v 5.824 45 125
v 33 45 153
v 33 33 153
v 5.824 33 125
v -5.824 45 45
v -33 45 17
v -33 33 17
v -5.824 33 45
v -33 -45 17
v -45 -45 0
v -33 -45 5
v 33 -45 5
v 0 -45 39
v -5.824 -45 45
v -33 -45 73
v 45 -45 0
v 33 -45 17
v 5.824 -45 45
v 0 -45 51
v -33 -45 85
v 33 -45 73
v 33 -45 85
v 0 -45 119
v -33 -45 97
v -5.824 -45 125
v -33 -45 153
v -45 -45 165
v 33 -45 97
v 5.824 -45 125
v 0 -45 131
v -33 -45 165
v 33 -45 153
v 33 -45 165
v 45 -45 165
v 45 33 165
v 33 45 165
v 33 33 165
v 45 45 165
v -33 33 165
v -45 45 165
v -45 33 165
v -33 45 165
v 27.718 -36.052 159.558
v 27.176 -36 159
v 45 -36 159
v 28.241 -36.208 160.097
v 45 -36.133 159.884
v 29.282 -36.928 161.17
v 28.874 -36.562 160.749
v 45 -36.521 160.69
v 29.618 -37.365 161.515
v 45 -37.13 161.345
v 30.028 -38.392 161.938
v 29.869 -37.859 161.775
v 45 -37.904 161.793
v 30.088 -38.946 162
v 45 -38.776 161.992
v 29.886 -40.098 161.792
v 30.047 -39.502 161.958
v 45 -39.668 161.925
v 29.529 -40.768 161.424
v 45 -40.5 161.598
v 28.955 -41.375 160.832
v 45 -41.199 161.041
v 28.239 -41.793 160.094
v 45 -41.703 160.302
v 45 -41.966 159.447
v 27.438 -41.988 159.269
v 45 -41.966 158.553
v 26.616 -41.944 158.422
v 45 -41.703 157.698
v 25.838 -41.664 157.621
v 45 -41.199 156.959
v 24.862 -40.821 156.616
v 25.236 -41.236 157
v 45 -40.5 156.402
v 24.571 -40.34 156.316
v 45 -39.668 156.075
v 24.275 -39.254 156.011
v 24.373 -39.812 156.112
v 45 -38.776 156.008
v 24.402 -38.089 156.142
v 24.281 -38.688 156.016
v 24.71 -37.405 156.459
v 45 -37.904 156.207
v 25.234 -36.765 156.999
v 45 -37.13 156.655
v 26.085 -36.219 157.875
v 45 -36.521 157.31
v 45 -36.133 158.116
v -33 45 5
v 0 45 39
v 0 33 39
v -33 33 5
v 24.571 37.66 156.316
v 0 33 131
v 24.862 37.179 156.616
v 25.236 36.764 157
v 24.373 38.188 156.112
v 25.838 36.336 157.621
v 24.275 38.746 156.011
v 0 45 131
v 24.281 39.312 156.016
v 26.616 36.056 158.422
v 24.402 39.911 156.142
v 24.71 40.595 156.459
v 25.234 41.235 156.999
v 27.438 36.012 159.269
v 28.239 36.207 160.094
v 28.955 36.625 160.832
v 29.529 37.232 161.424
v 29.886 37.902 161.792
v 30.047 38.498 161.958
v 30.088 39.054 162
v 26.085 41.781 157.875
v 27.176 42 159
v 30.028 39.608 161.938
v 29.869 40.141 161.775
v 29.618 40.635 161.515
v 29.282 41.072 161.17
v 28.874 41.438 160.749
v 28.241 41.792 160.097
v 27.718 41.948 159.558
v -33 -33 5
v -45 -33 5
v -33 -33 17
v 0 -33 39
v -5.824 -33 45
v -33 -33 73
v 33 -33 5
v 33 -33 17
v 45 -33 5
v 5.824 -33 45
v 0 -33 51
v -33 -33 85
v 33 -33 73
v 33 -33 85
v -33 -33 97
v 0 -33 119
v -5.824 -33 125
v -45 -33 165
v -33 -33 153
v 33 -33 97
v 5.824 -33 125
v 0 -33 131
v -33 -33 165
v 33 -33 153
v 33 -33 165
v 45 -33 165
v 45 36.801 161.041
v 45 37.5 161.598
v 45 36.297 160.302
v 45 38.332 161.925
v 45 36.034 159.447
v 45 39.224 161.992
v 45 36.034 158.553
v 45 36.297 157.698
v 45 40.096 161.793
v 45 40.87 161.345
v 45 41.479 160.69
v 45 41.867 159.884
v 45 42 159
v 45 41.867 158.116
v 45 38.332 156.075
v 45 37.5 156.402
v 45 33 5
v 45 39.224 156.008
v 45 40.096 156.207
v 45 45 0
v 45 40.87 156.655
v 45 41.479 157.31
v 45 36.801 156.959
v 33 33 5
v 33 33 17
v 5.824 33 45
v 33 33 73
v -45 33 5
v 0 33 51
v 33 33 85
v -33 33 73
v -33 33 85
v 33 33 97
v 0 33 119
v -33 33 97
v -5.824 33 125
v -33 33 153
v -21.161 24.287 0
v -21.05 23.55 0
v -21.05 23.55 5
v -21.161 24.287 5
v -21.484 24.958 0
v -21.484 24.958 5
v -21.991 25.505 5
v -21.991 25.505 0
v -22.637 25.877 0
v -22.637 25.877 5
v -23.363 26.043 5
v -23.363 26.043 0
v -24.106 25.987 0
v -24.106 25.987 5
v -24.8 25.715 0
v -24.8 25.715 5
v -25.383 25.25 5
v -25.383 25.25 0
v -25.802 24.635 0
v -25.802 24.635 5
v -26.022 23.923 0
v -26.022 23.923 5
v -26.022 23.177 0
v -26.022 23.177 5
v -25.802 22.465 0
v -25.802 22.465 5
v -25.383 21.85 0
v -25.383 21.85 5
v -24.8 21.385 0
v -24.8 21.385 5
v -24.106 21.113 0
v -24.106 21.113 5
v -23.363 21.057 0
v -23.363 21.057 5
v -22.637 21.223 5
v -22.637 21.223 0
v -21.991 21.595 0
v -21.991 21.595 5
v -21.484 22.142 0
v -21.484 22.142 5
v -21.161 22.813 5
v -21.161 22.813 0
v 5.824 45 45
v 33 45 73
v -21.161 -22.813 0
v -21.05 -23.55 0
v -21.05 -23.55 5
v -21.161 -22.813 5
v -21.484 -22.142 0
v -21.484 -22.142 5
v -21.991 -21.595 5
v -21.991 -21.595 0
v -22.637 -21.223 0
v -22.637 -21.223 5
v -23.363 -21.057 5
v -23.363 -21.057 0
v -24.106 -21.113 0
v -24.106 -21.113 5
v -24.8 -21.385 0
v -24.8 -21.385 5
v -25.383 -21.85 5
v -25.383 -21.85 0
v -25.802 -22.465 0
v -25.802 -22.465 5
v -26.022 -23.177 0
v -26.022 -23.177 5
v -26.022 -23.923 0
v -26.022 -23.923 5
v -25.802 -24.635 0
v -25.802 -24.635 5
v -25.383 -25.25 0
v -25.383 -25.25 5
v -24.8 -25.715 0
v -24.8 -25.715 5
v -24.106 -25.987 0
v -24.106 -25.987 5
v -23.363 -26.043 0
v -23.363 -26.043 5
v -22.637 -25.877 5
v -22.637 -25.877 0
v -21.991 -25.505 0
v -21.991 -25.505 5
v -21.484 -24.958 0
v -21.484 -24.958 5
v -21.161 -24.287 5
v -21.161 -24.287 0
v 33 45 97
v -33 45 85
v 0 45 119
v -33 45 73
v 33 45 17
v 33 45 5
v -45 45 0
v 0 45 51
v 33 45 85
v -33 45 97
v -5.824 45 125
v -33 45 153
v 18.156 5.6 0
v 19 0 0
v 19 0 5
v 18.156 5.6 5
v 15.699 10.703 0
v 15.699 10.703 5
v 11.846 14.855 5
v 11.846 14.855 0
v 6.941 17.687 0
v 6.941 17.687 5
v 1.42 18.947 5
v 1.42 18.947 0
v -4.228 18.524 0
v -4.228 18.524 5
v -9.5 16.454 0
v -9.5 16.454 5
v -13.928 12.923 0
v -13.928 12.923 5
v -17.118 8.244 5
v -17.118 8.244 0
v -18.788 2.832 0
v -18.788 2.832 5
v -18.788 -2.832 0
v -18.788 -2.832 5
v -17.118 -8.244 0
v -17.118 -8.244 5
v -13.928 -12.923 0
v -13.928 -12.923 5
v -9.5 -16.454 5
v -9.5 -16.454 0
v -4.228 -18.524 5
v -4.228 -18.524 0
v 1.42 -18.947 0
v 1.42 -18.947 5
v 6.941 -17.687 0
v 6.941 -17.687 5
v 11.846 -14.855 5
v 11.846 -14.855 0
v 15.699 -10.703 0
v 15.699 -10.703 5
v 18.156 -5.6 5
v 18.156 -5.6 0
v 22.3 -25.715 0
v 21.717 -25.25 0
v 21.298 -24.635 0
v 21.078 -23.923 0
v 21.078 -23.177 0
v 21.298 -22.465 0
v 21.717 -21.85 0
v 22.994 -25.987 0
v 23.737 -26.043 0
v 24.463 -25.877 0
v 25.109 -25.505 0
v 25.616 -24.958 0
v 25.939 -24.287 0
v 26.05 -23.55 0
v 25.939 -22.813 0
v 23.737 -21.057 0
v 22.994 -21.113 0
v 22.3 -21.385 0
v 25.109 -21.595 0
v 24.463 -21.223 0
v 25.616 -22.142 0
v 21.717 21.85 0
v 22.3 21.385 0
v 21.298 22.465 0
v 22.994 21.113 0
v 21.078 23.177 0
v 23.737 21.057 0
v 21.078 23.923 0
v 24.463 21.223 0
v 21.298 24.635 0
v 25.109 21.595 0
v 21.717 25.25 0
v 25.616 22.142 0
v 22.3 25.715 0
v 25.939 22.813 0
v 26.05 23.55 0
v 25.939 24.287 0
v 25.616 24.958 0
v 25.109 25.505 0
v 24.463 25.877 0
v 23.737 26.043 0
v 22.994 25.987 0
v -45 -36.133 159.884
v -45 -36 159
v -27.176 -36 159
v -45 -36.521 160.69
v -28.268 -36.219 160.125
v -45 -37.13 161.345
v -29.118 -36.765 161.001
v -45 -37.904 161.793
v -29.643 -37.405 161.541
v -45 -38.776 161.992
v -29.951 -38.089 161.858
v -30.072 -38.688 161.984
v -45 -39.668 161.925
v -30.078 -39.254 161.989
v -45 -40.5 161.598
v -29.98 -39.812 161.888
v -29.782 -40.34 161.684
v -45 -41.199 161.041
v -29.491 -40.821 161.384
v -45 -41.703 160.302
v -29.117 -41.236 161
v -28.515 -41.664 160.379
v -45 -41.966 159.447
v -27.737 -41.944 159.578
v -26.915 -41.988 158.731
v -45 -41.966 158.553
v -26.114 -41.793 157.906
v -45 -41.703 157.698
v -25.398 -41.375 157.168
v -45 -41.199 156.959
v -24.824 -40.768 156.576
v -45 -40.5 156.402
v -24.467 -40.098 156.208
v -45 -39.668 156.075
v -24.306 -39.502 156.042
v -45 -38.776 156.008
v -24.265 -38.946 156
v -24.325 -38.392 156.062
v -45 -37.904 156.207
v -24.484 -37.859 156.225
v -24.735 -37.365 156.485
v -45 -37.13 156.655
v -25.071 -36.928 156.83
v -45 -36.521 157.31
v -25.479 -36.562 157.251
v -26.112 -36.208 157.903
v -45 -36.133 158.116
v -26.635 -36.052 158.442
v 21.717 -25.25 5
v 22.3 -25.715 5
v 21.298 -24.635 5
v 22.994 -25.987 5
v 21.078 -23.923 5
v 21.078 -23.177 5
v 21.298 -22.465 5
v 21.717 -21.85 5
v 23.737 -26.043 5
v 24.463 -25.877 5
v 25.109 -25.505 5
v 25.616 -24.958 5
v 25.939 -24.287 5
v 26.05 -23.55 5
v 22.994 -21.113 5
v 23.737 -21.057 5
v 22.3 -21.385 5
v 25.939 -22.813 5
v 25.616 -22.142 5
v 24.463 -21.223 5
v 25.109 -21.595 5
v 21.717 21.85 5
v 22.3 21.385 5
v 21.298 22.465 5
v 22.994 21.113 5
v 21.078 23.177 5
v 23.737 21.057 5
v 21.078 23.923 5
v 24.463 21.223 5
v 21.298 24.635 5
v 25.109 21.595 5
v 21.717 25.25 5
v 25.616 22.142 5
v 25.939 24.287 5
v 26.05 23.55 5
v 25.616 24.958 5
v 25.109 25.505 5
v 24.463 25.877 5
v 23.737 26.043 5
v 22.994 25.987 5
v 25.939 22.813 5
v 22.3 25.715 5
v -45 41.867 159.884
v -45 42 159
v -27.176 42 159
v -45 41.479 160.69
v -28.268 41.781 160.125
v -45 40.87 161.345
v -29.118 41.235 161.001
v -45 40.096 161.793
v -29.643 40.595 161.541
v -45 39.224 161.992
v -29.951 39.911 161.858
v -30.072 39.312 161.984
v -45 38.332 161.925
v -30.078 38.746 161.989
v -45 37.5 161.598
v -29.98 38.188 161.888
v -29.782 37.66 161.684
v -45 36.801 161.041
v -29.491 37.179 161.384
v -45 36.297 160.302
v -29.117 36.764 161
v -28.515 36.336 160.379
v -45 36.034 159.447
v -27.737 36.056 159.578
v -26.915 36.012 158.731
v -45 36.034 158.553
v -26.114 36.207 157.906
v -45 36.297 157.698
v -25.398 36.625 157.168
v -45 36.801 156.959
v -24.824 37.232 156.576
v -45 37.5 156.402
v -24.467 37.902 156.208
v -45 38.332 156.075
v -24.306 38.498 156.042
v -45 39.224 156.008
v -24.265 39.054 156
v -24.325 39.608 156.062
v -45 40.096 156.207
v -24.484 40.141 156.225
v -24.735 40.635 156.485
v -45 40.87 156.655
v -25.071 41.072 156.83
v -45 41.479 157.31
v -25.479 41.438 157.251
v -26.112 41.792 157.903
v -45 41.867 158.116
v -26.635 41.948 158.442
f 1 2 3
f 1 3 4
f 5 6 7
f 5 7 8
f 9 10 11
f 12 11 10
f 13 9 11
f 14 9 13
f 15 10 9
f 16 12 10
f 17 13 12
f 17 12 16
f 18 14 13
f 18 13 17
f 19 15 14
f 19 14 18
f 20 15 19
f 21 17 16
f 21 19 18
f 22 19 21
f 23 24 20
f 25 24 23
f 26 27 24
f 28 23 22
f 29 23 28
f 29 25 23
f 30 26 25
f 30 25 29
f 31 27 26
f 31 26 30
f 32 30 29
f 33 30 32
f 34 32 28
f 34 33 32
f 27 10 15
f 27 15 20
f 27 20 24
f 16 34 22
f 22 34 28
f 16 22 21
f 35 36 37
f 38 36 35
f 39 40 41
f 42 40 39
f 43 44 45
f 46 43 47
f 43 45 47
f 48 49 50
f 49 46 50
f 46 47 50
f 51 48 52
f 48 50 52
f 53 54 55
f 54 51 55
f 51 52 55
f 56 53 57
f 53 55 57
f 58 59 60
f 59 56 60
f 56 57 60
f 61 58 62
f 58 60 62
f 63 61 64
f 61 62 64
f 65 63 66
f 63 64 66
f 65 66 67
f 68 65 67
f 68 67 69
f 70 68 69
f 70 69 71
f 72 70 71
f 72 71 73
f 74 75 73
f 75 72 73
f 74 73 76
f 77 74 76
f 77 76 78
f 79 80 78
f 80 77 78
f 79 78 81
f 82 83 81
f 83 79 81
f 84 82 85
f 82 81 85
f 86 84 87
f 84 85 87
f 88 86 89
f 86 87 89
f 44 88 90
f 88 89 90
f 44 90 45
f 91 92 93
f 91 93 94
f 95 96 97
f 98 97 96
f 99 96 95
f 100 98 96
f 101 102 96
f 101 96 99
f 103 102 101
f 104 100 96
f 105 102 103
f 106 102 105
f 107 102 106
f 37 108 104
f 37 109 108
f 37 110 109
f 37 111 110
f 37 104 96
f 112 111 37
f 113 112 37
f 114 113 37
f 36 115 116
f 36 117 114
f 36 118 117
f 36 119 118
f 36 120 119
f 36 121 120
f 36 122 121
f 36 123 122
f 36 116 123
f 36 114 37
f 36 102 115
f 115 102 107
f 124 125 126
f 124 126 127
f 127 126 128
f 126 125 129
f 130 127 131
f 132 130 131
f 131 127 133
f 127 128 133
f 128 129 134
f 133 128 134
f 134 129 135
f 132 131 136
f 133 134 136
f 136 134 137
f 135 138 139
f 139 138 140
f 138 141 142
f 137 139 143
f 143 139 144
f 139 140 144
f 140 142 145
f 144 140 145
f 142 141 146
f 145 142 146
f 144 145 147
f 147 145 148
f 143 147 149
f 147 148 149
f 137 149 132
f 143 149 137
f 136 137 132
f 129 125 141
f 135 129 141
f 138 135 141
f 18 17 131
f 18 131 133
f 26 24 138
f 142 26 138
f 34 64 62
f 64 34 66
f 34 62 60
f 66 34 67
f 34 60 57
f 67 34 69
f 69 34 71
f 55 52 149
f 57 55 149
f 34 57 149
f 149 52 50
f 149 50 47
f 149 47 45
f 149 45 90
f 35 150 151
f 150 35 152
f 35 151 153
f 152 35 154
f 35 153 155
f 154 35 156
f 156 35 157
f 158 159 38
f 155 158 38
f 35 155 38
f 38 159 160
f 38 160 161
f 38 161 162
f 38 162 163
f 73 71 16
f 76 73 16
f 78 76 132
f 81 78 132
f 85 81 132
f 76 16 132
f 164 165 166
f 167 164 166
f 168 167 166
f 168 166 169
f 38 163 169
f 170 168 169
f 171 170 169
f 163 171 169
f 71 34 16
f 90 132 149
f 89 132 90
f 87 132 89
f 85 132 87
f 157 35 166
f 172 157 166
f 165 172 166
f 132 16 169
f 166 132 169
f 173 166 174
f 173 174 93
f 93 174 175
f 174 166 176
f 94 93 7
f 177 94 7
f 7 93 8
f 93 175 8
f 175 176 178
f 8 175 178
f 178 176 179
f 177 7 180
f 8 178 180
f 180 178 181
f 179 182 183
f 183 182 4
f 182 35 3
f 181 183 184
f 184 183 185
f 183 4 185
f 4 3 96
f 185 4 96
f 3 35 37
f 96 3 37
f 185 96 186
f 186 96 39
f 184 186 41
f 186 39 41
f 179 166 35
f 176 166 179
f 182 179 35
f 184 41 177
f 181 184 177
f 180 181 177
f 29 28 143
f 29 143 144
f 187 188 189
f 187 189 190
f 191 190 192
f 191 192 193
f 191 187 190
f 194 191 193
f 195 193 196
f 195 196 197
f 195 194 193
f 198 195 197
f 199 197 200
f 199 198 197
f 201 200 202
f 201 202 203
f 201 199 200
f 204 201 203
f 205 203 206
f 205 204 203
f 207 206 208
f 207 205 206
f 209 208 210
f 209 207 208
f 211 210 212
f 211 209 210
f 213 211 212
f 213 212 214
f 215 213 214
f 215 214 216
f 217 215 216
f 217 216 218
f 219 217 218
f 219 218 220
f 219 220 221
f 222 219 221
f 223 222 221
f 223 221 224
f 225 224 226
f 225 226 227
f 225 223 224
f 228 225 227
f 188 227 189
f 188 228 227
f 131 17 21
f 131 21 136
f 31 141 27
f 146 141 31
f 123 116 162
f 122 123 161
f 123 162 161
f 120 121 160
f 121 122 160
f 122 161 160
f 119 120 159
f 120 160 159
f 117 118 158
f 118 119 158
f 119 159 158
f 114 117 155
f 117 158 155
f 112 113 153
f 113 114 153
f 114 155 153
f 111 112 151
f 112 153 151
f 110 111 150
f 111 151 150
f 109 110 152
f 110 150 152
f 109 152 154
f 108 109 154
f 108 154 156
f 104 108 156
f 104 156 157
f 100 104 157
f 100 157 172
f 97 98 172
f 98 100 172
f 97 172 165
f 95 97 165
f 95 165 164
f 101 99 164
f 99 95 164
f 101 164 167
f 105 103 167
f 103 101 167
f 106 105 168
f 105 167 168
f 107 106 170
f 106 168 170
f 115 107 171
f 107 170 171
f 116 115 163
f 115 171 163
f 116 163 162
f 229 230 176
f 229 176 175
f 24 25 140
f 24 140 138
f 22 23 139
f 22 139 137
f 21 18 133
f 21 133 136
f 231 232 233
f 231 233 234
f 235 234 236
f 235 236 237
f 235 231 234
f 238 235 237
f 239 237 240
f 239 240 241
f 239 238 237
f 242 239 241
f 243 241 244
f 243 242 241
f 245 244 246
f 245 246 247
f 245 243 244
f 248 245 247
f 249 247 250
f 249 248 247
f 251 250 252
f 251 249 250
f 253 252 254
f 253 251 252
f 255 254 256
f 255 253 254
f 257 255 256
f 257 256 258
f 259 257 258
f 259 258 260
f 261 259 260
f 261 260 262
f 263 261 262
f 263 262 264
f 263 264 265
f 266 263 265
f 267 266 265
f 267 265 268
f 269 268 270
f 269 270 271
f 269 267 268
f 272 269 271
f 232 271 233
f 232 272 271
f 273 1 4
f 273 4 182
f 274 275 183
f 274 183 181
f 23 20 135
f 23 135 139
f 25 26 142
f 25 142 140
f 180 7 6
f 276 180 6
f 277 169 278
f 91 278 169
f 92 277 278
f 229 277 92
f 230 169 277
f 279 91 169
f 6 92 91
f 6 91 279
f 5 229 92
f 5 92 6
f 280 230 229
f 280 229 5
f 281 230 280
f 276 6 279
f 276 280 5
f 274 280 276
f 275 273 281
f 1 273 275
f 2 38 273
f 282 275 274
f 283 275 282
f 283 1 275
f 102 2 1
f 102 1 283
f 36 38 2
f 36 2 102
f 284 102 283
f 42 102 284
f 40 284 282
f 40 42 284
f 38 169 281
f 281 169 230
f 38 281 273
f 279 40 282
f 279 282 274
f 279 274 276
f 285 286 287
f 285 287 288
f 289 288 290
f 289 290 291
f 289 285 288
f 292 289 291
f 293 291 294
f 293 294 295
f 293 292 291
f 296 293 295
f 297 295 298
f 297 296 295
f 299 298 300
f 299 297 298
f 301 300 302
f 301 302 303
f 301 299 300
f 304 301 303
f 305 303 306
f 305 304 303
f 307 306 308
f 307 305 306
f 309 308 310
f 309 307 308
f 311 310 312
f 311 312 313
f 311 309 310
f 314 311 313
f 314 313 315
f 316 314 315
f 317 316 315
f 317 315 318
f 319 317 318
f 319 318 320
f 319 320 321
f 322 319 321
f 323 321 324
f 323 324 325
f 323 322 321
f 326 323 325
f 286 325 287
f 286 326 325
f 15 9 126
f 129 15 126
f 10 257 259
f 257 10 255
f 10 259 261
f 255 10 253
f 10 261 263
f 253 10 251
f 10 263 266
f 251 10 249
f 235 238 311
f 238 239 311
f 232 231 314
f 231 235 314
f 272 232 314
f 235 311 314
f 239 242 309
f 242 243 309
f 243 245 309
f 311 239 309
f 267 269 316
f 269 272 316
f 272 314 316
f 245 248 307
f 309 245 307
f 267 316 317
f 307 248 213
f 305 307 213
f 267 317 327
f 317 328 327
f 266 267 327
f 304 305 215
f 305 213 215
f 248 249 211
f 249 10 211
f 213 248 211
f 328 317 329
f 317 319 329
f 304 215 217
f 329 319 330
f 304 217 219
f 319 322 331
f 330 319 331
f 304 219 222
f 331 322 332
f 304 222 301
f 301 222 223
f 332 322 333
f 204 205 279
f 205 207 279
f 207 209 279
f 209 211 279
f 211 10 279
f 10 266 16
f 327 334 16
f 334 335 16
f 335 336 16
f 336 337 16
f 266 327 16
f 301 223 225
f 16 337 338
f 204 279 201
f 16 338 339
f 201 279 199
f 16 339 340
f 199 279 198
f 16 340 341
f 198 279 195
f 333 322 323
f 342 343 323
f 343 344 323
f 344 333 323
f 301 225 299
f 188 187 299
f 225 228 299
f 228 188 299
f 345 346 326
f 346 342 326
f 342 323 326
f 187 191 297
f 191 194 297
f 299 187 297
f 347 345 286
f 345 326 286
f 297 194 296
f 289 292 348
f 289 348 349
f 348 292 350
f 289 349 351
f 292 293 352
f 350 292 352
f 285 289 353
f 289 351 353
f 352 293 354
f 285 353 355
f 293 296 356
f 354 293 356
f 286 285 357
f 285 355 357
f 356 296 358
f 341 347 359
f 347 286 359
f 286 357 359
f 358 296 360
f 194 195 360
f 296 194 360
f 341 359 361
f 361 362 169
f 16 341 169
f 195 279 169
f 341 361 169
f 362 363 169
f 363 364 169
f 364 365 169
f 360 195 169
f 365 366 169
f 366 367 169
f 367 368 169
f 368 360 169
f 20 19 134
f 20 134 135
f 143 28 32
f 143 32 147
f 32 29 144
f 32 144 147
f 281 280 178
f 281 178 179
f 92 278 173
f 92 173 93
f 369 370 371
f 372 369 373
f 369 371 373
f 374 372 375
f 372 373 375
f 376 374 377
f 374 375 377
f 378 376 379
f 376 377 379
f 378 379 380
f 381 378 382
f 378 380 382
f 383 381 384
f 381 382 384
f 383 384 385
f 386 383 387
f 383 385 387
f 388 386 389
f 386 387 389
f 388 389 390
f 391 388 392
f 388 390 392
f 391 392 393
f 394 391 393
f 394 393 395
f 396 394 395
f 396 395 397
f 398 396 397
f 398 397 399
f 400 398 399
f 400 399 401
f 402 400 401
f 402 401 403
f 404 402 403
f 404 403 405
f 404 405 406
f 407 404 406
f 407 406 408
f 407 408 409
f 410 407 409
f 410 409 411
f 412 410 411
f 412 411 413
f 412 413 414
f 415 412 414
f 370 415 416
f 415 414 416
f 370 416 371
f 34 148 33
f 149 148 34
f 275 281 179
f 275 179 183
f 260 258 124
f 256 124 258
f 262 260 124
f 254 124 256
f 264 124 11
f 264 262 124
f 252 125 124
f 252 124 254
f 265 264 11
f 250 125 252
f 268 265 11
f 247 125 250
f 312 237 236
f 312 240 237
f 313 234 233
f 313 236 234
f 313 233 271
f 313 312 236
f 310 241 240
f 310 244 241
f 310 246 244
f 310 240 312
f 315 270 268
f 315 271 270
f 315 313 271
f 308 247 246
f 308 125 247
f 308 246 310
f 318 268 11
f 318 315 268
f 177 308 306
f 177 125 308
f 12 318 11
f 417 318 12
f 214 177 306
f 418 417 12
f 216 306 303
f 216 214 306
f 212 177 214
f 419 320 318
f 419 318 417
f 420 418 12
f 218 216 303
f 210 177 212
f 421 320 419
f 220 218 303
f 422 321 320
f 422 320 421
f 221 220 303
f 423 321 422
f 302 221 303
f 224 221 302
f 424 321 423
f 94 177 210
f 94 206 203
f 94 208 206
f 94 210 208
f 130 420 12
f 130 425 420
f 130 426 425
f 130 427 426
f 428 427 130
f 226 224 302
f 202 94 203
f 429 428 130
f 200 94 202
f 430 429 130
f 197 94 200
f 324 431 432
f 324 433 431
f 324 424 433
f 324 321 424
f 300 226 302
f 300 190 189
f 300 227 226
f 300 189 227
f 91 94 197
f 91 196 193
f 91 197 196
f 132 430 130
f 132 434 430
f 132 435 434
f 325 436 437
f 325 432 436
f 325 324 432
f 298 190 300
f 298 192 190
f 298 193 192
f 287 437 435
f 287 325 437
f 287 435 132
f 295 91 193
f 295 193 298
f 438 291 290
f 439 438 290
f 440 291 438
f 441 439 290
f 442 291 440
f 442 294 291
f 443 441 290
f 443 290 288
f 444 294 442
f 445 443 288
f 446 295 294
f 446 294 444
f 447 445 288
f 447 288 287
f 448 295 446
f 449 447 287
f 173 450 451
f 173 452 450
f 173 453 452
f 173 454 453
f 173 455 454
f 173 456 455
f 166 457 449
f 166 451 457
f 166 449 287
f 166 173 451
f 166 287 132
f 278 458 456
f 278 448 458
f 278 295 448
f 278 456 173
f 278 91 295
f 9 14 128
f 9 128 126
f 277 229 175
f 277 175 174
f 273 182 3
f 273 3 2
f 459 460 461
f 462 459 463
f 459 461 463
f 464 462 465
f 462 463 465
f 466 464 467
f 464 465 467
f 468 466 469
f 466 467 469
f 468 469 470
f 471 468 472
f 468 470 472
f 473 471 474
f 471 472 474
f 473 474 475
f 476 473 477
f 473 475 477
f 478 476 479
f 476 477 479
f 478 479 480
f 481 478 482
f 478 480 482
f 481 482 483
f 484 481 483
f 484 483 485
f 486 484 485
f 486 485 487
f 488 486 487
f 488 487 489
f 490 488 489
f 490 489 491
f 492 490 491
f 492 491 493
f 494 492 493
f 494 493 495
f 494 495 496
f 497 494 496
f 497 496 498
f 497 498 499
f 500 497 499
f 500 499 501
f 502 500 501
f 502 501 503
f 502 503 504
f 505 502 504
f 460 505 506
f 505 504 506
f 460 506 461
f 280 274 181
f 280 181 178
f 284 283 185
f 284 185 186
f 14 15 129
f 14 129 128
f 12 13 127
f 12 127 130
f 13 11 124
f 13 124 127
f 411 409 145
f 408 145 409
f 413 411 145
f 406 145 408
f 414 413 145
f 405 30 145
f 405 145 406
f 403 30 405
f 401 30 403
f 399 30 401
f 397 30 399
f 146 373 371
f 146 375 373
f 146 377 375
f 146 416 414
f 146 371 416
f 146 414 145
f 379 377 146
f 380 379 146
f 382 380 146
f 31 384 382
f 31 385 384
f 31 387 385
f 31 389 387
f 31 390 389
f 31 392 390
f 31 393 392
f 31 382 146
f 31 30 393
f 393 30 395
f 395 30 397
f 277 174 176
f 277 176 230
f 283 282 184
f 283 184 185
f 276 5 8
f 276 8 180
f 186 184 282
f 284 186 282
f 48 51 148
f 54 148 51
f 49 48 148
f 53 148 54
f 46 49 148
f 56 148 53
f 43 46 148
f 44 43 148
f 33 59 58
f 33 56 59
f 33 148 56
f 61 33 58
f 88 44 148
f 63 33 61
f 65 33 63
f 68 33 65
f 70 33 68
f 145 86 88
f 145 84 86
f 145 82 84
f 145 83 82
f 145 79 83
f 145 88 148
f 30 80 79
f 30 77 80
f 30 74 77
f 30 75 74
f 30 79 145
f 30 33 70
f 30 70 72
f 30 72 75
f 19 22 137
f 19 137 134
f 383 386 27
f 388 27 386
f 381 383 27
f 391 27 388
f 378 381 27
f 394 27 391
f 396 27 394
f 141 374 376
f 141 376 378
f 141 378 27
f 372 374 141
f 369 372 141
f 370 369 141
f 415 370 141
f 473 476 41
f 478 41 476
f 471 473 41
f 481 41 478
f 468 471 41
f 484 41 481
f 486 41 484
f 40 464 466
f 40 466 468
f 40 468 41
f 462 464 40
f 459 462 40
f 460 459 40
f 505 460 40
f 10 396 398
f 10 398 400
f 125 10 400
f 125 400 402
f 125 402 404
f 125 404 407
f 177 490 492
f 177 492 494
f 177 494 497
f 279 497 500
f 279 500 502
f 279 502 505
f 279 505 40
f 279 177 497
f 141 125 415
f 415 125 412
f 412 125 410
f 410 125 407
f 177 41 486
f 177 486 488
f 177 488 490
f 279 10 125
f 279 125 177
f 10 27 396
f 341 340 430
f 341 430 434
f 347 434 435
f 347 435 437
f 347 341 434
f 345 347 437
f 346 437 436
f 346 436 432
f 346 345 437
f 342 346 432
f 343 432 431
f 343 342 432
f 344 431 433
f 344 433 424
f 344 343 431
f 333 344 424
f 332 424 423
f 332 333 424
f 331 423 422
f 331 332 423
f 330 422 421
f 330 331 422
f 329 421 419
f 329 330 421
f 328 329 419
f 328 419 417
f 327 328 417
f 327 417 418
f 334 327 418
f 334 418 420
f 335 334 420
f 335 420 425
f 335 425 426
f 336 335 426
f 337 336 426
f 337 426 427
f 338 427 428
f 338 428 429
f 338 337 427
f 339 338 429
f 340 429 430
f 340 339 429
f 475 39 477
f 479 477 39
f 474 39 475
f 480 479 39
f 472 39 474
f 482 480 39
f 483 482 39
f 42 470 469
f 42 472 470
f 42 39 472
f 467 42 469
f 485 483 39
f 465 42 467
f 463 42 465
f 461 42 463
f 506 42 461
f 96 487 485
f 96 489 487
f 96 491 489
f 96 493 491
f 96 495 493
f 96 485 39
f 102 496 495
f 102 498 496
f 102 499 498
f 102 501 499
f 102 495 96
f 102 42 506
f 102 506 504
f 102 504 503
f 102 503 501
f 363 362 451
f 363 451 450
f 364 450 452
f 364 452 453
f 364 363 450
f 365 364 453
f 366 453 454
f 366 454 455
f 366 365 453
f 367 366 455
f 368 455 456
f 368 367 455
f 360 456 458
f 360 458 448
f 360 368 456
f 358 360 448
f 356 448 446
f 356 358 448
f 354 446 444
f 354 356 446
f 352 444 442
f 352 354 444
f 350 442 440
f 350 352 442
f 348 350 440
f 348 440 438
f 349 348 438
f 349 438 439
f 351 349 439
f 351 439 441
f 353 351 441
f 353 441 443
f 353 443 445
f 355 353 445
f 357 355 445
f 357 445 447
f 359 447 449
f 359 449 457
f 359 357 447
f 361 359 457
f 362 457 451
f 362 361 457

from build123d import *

# Parameters (mm, degrees)
F0_W      = 90
F0_H      = 90
F0_R      = 2.5
F0_R_2    = 19
F1_DEPTH  = 5
F3_W      = 12
F3_H      = 12
F4_DEPTH  = 160
F7_DEPTH  = 12
F10_DEPTH = 12
F12_R     = 3
F13_DEPTH = 90.001


with BuildPart() as f1:
    # F0 (on Top) → F1 (new body)
    with BuildSketch(Plane.XY):
        Rectangle(F0_W, F0_H)
        with Locations((-23.55, -23.55)):
            Circle(F0_R, mode=Mode.SUBTRACT)
        with Locations((23.55, -23.55)):
            Circle(F0_R, mode=Mode.SUBTRACT)
        with Locations((-23.55, 23.55)):
            Circle(F0_R, mode=Mode.SUBTRACT)
        Circle(F0_R_2, mode=Mode.SUBTRACT)
        with Locations((23.55, 23.55)):
            Circle(F0_R, mode=Mode.SUBTRACT)
    extrude(amount=F1_DEPTH)

    # F3 (on offset) → F4 (join)
    with BuildSketch(Plane.XY.offset(5)):
        with Locations((-39, -39)):
            Rectangle(F3_W, F3_H)
        with Locations((39, -39)):
            Rectangle(F3_W, F3_H)
        with Locations((39, 39)):
            Rectangle(F3_W, F3_H)
        with Locations((-39, 39)):
            Rectangle(F3_W, F3_H)
    extrude(amount=F4_DEPTH)

    # F6 (on offset) → F7 (join)
    with BuildSketch(Plane.XZ.offset(45)):
        Polygon((0, 51), (5.8235294118, 45), (33, 73), (33, 85), align=None)
        Polygon((0, 119), (33, 85), (33, 97), (5.8235294118, 125), align=None)
        Polygon((0, 131), (5.8235294118, 125), (33, 153), (33, 165), align=None)
        Polygon((-33, 153), (-5.8235294118, 125), (0, 131), (-33, 165), align=None)
        Polygon((-33, 97), (-33, 85), (0, 119), (-5.8235294118, 125), align=None)
        Polygon((-5.8235294118, 125), (0, 119), (5.8235294118, 125), (0, 131), align=None)
        Polygon((-5.8235294118, 45), (0, 39), (5.8235294118, 45), (0, 51), align=None)
        Polygon((-33, 73), (-5.8235294118, 45), (0, 51), (-33, 85), align=None)
        Polygon((-33, 17), (-33, 5), (0, 39), (-5.8235294118, 45), align=None)
        Polygon((5.8235294118, 45), (0, 39), (33, 5), (33, 17), align=None)
    extrude(amount=-F7_DEPTH)

    # F9 (on offset) → F10 (join)
    with BuildSketch(Plane(origin=(0, 45, 0), x_dir=(-1, 0, 0), z_dir=(0, 1, 0))):
        Polygon((-33, 153), (-5.8235294118, 125), (0, 131), (-33, 165), align=None)
        Polygon((-5.8235294118, 125), (0, 119), (5.8235294118, 125), (0, 131), align=None)
        Polygon((0, 131), (5.8235294118, 125), (33, 153), (33, 165), align=None)
        Polygon((0, 119), (33, 85), (33, 97), (5.8235294118, 125), align=None)
        Polygon((-33, 85), (0, 119), (-5.8235294118, 125), (-33, 97), align=None)
        Polygon((-5.8235294118, 45), (0, 51), (-33, 85), (-33, 73), align=None)
        Polygon((0, 39), (-5.8235294118, 45), (-33, 17), (-33, 5), align=None)
        Polygon((33, 73), (33, 85), (0, 51), (5.8235294118, 45), align=None)
        Polygon((33, 17), (5.8235294118, 45), (0, 39), (33, 5), align=None)
        Polygon((5.8235294118, 45), (0, 51), (-5.8235294118, 45), (0, 39), align=None)
    extrude(amount=-F10_DEPTH)

    # F12 (on offset) → F13 (cut, through all)
    with BuildSketch(Plane.YZ.offset(45)):
        with Locations((-39, 159)):
            Circle(F12_R)
        with Locations((39, 159)):
            Circle(F12_R)
    extrude(amount=-F13_DEPTH, mode=Mode.SUBTRACT)


solid = f1.part
